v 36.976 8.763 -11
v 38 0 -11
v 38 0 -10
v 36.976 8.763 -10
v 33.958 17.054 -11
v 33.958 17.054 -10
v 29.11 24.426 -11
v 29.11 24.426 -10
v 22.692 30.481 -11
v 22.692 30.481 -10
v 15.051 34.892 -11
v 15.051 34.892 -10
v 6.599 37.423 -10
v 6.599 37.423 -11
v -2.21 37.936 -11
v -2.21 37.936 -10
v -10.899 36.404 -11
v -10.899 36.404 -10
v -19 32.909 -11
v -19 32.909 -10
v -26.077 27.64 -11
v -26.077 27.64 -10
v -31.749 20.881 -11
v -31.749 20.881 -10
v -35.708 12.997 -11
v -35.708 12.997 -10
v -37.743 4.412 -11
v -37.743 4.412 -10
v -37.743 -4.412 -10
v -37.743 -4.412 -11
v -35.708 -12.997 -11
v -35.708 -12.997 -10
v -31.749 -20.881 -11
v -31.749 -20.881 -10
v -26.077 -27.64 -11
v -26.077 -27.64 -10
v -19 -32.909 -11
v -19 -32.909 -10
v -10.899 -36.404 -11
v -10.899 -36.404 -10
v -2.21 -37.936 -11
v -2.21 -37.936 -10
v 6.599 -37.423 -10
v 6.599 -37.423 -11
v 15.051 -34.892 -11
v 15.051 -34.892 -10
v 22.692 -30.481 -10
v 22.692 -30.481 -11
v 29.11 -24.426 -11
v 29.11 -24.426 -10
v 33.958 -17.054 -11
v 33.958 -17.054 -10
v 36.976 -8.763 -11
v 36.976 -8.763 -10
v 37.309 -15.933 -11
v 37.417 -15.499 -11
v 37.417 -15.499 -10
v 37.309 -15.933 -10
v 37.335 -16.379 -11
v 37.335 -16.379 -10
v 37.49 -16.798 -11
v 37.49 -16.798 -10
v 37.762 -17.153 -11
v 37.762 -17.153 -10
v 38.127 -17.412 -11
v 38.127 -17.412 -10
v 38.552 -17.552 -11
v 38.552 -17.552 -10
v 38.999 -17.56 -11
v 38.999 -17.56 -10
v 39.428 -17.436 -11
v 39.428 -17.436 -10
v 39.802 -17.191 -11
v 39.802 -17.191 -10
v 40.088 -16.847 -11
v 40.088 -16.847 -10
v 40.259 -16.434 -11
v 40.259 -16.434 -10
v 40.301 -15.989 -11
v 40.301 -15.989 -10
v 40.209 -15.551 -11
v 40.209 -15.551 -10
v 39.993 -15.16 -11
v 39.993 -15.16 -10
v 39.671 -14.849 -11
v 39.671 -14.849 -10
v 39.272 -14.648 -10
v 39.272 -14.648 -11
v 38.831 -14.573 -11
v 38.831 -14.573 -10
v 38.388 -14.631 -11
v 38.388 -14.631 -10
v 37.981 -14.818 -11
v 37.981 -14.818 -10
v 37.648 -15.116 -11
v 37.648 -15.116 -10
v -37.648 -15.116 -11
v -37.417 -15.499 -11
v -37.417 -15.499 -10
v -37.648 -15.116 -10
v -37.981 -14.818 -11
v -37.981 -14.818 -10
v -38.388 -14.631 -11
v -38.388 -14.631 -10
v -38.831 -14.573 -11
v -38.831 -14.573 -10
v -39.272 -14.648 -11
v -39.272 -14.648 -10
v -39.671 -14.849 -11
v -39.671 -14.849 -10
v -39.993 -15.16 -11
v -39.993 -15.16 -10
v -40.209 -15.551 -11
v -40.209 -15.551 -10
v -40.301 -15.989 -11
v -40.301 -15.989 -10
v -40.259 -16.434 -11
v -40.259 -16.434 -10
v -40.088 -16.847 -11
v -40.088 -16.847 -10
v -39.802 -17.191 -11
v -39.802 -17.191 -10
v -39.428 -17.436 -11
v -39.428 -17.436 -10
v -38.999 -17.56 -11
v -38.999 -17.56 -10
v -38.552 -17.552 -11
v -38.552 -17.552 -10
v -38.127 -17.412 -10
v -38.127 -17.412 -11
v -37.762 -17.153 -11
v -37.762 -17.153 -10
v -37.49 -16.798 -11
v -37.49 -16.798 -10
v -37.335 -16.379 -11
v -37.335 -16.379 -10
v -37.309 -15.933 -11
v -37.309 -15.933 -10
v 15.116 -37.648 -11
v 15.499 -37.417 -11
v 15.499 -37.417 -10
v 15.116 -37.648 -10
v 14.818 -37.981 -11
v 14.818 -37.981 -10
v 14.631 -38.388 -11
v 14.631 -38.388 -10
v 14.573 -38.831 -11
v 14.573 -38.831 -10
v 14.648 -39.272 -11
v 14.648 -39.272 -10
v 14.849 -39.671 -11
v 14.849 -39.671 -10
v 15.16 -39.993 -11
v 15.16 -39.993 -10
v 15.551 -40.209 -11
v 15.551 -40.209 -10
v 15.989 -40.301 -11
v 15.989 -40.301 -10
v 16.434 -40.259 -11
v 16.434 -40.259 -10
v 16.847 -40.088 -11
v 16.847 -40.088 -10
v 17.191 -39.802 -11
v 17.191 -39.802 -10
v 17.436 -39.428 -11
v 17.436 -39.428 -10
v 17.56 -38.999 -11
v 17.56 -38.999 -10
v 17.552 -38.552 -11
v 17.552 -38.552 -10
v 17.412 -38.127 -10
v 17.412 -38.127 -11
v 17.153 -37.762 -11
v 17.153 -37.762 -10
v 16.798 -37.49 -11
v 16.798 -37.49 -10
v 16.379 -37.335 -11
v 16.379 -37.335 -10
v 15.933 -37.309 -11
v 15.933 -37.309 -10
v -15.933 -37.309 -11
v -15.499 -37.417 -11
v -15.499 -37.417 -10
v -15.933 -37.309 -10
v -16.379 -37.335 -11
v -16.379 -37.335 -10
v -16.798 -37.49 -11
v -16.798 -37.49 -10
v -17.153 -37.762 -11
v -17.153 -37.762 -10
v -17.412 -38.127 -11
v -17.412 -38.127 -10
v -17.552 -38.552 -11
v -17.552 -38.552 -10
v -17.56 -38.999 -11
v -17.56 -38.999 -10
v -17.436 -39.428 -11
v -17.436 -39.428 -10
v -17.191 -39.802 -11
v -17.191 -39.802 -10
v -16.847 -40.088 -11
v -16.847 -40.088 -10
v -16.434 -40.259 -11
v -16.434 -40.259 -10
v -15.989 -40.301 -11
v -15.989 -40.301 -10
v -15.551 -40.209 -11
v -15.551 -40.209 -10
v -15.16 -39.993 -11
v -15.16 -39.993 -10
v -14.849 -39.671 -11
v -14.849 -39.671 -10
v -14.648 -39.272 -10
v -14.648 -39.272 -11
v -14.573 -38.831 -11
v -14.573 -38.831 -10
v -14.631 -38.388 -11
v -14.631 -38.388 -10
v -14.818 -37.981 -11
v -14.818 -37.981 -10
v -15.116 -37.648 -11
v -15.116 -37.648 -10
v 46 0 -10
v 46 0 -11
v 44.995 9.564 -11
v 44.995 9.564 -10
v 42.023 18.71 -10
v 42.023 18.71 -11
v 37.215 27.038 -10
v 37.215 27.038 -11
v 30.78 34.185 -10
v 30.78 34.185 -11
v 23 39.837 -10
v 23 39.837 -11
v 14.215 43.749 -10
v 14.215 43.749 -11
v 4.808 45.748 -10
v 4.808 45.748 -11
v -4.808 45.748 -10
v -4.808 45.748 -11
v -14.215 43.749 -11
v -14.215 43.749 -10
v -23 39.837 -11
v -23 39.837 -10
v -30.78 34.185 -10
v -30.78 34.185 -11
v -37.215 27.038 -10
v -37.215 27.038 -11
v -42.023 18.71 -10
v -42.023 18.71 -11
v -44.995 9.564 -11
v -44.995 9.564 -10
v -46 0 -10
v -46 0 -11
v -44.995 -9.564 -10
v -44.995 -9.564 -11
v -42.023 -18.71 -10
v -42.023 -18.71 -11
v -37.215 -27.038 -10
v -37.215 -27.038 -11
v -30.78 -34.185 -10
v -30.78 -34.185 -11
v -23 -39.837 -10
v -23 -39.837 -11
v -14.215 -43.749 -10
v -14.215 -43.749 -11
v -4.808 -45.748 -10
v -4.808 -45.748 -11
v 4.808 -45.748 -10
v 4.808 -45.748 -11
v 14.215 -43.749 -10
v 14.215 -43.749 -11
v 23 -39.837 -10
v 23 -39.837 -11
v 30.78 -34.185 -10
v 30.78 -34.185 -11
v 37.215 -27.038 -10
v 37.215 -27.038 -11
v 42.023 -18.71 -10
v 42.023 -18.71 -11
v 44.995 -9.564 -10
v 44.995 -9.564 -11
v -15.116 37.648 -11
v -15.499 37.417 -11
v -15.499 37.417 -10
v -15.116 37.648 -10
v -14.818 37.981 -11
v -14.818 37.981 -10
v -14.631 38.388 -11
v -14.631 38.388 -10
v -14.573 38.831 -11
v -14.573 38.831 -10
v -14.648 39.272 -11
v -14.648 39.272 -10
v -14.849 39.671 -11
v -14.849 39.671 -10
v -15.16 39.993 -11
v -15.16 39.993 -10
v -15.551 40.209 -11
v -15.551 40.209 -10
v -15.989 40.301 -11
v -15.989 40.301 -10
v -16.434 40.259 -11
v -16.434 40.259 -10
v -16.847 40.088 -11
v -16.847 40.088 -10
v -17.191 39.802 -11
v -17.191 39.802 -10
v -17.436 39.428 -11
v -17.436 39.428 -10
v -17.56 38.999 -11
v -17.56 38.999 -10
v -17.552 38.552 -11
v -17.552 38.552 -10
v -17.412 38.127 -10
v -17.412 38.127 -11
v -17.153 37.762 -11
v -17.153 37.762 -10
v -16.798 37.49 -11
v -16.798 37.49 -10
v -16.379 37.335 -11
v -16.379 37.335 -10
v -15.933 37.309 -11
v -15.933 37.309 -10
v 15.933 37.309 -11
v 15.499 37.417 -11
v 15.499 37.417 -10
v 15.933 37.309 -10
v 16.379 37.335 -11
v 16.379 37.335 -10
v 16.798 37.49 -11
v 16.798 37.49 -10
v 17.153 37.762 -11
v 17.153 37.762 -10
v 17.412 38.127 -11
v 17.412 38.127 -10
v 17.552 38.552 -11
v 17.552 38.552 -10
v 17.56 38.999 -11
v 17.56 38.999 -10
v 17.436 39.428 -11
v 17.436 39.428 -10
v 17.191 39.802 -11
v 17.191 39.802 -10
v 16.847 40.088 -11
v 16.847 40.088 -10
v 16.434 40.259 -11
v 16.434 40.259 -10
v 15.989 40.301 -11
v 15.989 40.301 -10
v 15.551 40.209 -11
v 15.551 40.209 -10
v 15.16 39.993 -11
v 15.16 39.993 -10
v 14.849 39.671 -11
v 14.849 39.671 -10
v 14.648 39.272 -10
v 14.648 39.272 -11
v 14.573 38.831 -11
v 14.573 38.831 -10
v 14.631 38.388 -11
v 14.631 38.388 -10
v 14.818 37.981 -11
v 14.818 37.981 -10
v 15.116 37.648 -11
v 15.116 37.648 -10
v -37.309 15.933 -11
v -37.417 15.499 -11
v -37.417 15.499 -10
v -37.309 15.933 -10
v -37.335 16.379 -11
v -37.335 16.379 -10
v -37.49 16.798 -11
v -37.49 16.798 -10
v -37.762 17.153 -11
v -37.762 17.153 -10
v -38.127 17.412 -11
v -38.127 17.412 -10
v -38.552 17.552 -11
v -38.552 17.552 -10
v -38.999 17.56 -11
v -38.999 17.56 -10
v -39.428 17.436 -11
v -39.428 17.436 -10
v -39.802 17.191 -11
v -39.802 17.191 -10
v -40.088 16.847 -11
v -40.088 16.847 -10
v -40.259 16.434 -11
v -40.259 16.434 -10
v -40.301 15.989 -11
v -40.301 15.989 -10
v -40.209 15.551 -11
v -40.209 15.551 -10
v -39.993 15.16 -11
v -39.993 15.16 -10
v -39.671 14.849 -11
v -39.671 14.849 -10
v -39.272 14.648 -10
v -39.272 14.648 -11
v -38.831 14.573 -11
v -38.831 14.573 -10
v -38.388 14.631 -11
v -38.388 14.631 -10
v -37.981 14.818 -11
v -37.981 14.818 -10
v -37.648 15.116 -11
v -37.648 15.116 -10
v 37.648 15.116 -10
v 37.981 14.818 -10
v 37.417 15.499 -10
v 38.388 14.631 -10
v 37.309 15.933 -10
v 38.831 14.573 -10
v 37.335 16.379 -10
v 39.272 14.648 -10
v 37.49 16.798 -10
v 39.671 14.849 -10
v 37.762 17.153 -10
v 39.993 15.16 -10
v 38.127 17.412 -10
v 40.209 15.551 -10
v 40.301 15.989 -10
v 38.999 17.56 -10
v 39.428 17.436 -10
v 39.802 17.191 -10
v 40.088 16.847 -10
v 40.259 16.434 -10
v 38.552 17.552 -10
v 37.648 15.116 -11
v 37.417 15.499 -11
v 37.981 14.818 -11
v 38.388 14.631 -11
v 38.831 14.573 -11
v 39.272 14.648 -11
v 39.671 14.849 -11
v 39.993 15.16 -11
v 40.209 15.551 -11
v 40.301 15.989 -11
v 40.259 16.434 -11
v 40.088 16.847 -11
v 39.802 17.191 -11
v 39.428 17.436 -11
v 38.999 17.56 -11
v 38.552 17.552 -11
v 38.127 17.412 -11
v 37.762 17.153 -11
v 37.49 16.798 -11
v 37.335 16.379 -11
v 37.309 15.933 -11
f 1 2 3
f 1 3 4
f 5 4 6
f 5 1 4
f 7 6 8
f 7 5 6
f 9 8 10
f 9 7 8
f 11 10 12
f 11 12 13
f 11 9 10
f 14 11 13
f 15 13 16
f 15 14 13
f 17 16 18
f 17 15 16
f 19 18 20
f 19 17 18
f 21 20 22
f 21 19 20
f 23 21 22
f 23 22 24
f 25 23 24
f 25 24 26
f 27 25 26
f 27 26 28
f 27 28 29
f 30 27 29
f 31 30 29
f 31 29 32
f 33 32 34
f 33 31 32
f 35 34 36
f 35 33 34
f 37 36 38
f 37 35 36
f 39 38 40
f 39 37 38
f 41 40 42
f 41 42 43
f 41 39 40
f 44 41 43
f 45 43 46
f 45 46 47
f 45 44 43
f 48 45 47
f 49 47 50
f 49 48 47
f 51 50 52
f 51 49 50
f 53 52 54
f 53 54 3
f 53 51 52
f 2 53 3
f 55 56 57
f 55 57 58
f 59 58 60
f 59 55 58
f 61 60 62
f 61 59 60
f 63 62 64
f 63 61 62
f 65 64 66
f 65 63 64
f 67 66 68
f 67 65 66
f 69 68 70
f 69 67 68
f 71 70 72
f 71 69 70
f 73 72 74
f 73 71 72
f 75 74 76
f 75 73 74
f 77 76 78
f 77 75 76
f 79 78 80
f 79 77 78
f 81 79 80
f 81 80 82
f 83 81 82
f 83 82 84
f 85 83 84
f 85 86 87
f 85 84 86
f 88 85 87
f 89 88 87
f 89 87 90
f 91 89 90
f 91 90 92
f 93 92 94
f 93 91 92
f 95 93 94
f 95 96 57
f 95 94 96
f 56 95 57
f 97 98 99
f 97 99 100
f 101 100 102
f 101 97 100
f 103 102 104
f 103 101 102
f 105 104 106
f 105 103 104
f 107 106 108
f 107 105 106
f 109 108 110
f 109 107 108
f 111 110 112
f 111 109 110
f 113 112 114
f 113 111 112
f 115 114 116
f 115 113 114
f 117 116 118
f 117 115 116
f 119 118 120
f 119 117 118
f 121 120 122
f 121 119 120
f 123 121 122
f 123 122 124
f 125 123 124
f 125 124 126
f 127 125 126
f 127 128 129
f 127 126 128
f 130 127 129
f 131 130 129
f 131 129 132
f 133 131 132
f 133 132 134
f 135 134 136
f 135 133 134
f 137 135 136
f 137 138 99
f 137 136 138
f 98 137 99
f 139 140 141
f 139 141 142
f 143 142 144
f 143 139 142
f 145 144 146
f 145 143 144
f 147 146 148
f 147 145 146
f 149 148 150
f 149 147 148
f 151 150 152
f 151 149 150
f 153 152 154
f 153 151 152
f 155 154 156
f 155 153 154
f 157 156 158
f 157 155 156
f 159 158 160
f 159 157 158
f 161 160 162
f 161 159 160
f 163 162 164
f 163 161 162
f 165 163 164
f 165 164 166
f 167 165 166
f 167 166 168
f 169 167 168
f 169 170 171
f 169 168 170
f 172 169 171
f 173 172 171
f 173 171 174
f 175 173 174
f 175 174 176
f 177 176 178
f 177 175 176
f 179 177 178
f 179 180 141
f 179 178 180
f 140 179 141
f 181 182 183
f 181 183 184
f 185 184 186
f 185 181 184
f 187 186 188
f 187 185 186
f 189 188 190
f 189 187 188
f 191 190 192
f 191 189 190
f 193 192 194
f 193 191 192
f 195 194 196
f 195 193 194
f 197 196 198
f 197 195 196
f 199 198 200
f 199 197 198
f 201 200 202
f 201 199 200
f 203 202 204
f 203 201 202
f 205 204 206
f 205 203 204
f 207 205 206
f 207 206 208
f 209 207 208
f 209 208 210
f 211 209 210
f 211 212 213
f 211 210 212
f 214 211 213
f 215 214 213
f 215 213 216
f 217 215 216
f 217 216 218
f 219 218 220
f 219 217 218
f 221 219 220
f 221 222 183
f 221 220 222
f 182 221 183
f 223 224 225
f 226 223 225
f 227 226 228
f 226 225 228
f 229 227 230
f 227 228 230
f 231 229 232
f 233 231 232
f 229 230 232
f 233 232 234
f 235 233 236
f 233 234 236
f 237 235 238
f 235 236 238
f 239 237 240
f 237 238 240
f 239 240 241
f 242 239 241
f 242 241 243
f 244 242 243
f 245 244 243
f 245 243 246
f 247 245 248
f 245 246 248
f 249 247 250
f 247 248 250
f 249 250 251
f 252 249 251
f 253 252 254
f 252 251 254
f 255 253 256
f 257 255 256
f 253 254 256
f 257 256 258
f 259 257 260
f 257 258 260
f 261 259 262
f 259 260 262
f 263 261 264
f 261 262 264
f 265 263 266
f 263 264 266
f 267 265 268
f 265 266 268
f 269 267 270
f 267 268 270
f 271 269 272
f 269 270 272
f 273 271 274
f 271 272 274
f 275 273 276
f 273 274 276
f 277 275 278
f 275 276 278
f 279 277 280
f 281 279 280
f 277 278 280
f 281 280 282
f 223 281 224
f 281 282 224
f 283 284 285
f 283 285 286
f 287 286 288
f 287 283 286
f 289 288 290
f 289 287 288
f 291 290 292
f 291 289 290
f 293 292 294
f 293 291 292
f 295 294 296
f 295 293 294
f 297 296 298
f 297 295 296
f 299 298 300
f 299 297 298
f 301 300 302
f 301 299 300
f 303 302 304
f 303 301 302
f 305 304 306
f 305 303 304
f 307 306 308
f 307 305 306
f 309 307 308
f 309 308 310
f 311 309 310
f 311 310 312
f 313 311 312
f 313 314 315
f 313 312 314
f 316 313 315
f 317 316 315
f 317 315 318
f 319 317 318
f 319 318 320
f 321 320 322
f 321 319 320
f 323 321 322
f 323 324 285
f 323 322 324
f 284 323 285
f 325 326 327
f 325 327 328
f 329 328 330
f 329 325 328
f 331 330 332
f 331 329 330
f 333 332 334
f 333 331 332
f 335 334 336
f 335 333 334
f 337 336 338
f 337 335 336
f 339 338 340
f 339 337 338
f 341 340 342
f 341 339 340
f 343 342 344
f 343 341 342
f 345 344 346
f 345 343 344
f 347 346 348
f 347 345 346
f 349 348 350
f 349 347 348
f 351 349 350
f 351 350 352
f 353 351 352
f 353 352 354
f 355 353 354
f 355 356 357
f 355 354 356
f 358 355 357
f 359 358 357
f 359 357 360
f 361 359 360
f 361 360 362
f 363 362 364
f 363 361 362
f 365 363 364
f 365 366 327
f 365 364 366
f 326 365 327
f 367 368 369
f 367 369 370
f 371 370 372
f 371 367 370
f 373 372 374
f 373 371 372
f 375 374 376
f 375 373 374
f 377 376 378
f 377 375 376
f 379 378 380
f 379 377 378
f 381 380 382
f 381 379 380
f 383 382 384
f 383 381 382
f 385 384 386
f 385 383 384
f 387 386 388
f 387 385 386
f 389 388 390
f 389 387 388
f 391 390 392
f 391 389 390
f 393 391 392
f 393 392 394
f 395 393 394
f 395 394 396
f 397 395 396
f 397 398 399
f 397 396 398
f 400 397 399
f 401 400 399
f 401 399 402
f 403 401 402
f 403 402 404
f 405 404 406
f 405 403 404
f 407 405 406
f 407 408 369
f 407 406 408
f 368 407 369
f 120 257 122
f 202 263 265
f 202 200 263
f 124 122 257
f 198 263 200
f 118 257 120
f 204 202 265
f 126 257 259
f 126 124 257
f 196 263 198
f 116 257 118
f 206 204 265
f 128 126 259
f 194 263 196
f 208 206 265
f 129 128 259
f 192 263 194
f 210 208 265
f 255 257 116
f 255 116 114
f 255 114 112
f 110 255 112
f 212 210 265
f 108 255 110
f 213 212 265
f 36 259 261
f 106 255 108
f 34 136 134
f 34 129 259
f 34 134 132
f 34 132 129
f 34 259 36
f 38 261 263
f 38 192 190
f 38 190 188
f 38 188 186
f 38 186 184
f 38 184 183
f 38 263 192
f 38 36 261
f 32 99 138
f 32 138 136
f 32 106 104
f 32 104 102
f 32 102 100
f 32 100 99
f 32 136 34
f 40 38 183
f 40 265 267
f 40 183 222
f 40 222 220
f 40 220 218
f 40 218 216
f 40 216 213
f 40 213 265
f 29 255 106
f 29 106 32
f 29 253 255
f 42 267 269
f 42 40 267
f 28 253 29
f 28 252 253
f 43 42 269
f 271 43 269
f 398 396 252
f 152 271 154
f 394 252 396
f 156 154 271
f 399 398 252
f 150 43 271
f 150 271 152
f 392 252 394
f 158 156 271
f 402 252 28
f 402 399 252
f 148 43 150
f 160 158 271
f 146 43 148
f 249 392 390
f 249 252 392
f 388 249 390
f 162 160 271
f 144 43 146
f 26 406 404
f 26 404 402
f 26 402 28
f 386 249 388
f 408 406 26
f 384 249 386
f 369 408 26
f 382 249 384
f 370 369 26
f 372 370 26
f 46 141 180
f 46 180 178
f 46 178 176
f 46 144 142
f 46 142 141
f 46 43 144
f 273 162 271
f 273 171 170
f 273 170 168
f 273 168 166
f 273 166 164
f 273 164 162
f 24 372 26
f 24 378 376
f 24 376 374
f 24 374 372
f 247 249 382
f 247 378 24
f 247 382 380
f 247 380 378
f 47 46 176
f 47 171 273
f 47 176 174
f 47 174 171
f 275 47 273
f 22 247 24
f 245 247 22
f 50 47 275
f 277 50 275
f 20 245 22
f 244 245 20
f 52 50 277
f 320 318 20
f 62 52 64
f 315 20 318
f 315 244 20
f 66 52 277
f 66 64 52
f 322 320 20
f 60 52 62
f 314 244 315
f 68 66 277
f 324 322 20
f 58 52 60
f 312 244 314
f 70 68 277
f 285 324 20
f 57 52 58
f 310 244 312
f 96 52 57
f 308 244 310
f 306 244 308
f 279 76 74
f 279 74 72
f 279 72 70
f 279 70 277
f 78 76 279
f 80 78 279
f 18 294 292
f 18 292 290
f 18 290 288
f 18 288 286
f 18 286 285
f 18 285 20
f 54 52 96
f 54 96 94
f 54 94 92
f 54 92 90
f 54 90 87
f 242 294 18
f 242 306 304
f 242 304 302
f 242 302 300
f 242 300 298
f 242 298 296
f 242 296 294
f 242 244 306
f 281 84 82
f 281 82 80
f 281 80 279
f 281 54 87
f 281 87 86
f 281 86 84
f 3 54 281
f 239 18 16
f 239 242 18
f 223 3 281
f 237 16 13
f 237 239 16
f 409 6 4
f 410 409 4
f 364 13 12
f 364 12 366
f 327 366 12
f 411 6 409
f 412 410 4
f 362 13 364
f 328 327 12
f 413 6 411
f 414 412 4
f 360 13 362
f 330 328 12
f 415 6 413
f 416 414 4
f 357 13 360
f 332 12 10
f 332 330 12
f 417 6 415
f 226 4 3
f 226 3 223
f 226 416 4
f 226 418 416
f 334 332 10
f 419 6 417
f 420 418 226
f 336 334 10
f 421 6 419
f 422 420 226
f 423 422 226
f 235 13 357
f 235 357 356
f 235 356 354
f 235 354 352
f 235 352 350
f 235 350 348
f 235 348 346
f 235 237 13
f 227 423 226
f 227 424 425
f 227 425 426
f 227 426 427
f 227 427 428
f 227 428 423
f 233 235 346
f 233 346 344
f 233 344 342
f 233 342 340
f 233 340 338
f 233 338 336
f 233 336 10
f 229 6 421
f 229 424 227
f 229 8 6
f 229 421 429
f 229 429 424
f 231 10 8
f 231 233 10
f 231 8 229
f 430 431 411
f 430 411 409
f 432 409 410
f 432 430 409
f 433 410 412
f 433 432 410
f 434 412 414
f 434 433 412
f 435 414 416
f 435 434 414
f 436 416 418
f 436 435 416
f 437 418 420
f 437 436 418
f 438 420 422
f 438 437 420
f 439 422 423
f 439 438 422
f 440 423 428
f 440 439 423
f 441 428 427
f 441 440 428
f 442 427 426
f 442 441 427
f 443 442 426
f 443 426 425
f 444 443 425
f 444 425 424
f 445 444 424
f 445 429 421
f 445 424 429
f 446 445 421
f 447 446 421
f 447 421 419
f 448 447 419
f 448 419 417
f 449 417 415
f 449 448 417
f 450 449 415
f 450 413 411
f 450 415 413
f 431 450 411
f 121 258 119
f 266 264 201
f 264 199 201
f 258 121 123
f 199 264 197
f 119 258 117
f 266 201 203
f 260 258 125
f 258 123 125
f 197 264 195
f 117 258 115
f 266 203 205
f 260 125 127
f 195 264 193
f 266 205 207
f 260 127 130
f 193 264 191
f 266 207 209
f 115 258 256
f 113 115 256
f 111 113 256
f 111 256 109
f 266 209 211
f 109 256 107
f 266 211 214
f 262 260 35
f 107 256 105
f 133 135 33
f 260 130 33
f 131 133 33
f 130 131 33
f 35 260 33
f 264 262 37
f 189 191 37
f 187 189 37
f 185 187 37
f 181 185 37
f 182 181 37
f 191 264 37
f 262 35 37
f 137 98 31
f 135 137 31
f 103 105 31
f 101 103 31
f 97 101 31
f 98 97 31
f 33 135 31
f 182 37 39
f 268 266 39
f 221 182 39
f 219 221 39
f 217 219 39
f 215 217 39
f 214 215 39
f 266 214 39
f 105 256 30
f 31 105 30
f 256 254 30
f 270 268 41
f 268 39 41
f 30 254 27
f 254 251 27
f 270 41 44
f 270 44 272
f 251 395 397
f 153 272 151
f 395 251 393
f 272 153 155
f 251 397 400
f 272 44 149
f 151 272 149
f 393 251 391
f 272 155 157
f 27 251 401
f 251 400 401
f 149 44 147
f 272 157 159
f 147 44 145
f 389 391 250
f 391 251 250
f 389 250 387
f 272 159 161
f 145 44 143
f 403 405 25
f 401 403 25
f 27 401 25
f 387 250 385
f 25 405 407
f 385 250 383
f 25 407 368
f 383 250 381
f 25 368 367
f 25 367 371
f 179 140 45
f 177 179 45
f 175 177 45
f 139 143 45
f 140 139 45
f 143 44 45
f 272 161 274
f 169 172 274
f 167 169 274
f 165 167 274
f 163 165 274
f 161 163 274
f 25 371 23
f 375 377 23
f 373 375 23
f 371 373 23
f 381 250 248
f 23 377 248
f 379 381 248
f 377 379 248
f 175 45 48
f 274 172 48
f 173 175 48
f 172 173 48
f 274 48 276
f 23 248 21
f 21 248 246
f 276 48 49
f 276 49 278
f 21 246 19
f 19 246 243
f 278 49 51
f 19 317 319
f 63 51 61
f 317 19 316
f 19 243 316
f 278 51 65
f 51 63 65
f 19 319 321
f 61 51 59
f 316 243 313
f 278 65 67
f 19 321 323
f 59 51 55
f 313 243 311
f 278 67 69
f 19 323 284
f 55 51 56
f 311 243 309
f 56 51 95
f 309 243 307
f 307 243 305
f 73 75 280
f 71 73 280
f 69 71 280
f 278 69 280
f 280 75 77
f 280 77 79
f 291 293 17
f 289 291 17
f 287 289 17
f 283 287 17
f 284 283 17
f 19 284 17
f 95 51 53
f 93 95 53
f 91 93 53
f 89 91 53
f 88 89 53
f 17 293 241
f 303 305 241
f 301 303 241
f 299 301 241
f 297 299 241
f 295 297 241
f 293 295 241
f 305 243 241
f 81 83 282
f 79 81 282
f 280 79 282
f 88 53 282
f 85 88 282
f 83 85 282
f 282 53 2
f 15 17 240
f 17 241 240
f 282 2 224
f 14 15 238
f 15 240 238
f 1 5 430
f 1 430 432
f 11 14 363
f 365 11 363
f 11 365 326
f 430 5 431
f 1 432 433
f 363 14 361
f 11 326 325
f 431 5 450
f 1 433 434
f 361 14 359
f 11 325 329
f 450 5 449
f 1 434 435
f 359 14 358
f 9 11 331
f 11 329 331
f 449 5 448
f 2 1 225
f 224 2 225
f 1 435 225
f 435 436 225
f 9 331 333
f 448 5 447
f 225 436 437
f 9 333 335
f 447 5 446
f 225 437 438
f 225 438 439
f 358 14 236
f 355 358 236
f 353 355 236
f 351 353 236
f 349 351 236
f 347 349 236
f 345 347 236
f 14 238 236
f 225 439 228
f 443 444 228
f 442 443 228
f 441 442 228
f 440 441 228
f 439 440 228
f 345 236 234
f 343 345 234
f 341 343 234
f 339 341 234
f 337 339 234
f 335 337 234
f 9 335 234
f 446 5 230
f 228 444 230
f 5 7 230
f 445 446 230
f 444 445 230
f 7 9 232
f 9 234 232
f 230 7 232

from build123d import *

# Parameters (mm, degrees)
CYLINDER323_R               = 1.5
CYLINDER323_DEPTH           = 30
CYLINDER323_PLACEMENT_ANGLE = 67.5
CYLINDER324_R               = 1.5
CYLINDER324_DEPTH           = 30
CYLINDER324_PLACEMENT_ANGLE = 112.5
CYLINDER011_R               = 1.5
CYLINDER011_DEPTH           = 30
CYLINDER011_PLACEMENT_ANGLE = 157.5
CYLINDER012_R               = 1.5
CYLINDER012_DEPTH           = 30
CYLINDER012_PLACEMENT_ANGLE = 202.5
CYLINDER013_R               = 1.5
CYLINDER013_DEPTH           = 30
CYLINDER013_PLACEMENT_ANGLE = 112.500002
CYLINDER014_R               = 1.5
CYLINDER014_DEPTH           = 30
CYLINDER014_PLACEMENT_ANGLE = 67.5
CYLINDER015_R               = 1.5
CYLINDER015_DEPTH           = 30
CYLINDER015_PLACEMENT_ANGLE = 22.5
CYLINDER325_R               = 1.5
CYLINDER325_DEPTH           = 30
CYLINDER325_PLACEMENT_ANGLE = 22.5
TUBE004_R                   = 46
TUBE004_R_2                 = 38
TUBE004_DEPTH               = 1


with BuildPart() as v_lec323:
    # Cylinder323 → Cylinder323 (new body)
    with BuildSketch(Plane.XY):
        Circle(CYLINDER323_R)
    extrude(amount=CYLINDER323_DEPTH)


with BuildPart() as v_lec323_1:
    # Cylinder323 placement: moved
    add(v_lec323.part.moved(Location((-16.072704, -38.80294, 40))).rotate(Axis((-16.072704, -38.80294, 40), (0, 0, 1)), CYLINDER323_PLACEMENT_ANGLE))


with BuildPart() as v_lec324:
    # Cylinder324 → Cylinder324 (new body)
    with BuildSketch(Plane.XY):
        Circle(CYLINDER324_R)
    extrude(amount=CYLINDER324_DEPTH)


with BuildPart() as v_lec324_1:
    # Cylinder324 placement: moved
    add(v_lec324.part.moved(Location((16.072704, -38.80294, 40))).rotate(Axis((16.072704, -38.80294, 40), (0, 0, 1)), CYLINDER324_PLACEMENT_ANGLE))


with BuildPart() as v_lec011:
    # Cylinder011 → Cylinder011 (new body)
    with BuildSketch(Plane.XY):
        Circle(CYLINDER011_R)
    extrude(amount=CYLINDER011_DEPTH)


with BuildPart() as v_lec011_1:
    # Cylinder011 placement: moved
    add(v_lec011.part.moved(Location((38.80294, -16.072704, 40))).rotate(Axis((38.80294, -16.072704, 40), (0, 0, 1)), CYLINDER011_PLACEMENT_ANGLE))


with BuildPart() as v_lec012:
    # Cylinder012 → Cylinder012 (new body)
    with BuildSketch(Plane.XY):
        Circle(CYLINDER012_R)
    extrude(amount=CYLINDER012_DEPTH)


with BuildPart() as v_lec012_1:
    # Cylinder012 placement: moved
    add(v_lec012.part.moved(Location((38.80294, 16.072704, 40))).rotate(Axis((38.80294, 16.072704, 40), (0, 0, 1)), CYLINDER012_PLACEMENT_ANGLE))


with BuildPart() as v_lec013:
    # Cylinder013 → Cylinder013 (new body)
    with BuildSketch(Plane.XY):
        Circle(CYLINDER013_R)
    extrude(amount=CYLINDER013_DEPTH)


with BuildPart() as v_lec013_1:
    # Cylinder013 placement: moved
    add(v_lec013.part.moved(Location((16.072704, 38.80294, 40))).rotate(Axis((16.072704, 38.80294, 40), (0, 0, -1)), CYLINDER013_PLACEMENT_ANGLE))


with BuildPart() as v_lec014:
    # Cylinder014 → Cylinder014 (new body)
    with BuildSketch(Plane.XY):
        Circle(CYLINDER014_R)
    extrude(amount=CYLINDER014_DEPTH)


with BuildPart() as v_lec014_1:
    # Cylinder014 placement: moved
    add(v_lec014.part.moved(Location((-16.072704, 38.80294, 40))).rotate(Axis((-16.072704, 38.80294, 40), (0, 0, -1)), CYLINDER014_PLACEMENT_ANGLE))


with BuildPart() as v_lec015:
    # Cylinder015 → Cylinder015 (new body)
    with BuildSketch(Plane.XY):
        Circle(CYLINDER015_R)
    extrude(amount=CYLINDER015_DEPTH)


with BuildPart() as v_lec015_1:
    # Cylinder015 placement: moved
    add(v_lec015.part.moved(Location((-38.80294, 16.072704, 40))).rotate(Axis((-38.80294, 16.072704, 40), (0, 0, -1)), CYLINDER015_PLACEMENT_ANGLE))


with BuildPart() as compound249:
    # Cylinder325 → Cylinder325 (new body)
    with BuildSketch(Plane.XY):
        Circle(CYLINDER325_R)
    extrude(amount=CYLINDER325_DEPTH)


with BuildPart() as compound249_1:
    # Cylinder325 placement: moved
    add(compound249.part.moved(Location((-38.80294, -16.072704, 40))).rotate(Axis((-38.80294, -16.072704, 40), (0, 0, 1)), CYLINDER325_PLACEMENT_ANGLE))

    # Compound249: union Válec323, Válec324, Válec011, Válec012, Válec013, Válec014, Válec015
    add(v_lec323_1.part)
    add(v_lec324_1.part)
    add(v_lec011_1.part)
    add(v_lec012_1.part)
    add(v_lec013_1.part)
    add(v_lec014_1.part)
    add(v_lec015_1.part)


with BuildPart() as podaktuarni_podlozka:
    # Tube004 → Tube004 (new body)
    with BuildSketch(Plane.XY.offset(50)):
        Circle(TUBE004_R)
        Circle(TUBE004_R_2, mode=Mode.SUBTRACT)
    extrude(amount=TUBE004_DEPTH)

    # Cut011: cut Compound249
    add(compound249_1.part, mode=Mode.SUBTRACT)


with BuildPart() as podaktuarni_podlozka_1:
    # Cut011 placement: moved
    add(podaktuarni_podlozka.part.moved(Location((0, 0, -61))))


solid = podaktuarni_podlozka_1.part
